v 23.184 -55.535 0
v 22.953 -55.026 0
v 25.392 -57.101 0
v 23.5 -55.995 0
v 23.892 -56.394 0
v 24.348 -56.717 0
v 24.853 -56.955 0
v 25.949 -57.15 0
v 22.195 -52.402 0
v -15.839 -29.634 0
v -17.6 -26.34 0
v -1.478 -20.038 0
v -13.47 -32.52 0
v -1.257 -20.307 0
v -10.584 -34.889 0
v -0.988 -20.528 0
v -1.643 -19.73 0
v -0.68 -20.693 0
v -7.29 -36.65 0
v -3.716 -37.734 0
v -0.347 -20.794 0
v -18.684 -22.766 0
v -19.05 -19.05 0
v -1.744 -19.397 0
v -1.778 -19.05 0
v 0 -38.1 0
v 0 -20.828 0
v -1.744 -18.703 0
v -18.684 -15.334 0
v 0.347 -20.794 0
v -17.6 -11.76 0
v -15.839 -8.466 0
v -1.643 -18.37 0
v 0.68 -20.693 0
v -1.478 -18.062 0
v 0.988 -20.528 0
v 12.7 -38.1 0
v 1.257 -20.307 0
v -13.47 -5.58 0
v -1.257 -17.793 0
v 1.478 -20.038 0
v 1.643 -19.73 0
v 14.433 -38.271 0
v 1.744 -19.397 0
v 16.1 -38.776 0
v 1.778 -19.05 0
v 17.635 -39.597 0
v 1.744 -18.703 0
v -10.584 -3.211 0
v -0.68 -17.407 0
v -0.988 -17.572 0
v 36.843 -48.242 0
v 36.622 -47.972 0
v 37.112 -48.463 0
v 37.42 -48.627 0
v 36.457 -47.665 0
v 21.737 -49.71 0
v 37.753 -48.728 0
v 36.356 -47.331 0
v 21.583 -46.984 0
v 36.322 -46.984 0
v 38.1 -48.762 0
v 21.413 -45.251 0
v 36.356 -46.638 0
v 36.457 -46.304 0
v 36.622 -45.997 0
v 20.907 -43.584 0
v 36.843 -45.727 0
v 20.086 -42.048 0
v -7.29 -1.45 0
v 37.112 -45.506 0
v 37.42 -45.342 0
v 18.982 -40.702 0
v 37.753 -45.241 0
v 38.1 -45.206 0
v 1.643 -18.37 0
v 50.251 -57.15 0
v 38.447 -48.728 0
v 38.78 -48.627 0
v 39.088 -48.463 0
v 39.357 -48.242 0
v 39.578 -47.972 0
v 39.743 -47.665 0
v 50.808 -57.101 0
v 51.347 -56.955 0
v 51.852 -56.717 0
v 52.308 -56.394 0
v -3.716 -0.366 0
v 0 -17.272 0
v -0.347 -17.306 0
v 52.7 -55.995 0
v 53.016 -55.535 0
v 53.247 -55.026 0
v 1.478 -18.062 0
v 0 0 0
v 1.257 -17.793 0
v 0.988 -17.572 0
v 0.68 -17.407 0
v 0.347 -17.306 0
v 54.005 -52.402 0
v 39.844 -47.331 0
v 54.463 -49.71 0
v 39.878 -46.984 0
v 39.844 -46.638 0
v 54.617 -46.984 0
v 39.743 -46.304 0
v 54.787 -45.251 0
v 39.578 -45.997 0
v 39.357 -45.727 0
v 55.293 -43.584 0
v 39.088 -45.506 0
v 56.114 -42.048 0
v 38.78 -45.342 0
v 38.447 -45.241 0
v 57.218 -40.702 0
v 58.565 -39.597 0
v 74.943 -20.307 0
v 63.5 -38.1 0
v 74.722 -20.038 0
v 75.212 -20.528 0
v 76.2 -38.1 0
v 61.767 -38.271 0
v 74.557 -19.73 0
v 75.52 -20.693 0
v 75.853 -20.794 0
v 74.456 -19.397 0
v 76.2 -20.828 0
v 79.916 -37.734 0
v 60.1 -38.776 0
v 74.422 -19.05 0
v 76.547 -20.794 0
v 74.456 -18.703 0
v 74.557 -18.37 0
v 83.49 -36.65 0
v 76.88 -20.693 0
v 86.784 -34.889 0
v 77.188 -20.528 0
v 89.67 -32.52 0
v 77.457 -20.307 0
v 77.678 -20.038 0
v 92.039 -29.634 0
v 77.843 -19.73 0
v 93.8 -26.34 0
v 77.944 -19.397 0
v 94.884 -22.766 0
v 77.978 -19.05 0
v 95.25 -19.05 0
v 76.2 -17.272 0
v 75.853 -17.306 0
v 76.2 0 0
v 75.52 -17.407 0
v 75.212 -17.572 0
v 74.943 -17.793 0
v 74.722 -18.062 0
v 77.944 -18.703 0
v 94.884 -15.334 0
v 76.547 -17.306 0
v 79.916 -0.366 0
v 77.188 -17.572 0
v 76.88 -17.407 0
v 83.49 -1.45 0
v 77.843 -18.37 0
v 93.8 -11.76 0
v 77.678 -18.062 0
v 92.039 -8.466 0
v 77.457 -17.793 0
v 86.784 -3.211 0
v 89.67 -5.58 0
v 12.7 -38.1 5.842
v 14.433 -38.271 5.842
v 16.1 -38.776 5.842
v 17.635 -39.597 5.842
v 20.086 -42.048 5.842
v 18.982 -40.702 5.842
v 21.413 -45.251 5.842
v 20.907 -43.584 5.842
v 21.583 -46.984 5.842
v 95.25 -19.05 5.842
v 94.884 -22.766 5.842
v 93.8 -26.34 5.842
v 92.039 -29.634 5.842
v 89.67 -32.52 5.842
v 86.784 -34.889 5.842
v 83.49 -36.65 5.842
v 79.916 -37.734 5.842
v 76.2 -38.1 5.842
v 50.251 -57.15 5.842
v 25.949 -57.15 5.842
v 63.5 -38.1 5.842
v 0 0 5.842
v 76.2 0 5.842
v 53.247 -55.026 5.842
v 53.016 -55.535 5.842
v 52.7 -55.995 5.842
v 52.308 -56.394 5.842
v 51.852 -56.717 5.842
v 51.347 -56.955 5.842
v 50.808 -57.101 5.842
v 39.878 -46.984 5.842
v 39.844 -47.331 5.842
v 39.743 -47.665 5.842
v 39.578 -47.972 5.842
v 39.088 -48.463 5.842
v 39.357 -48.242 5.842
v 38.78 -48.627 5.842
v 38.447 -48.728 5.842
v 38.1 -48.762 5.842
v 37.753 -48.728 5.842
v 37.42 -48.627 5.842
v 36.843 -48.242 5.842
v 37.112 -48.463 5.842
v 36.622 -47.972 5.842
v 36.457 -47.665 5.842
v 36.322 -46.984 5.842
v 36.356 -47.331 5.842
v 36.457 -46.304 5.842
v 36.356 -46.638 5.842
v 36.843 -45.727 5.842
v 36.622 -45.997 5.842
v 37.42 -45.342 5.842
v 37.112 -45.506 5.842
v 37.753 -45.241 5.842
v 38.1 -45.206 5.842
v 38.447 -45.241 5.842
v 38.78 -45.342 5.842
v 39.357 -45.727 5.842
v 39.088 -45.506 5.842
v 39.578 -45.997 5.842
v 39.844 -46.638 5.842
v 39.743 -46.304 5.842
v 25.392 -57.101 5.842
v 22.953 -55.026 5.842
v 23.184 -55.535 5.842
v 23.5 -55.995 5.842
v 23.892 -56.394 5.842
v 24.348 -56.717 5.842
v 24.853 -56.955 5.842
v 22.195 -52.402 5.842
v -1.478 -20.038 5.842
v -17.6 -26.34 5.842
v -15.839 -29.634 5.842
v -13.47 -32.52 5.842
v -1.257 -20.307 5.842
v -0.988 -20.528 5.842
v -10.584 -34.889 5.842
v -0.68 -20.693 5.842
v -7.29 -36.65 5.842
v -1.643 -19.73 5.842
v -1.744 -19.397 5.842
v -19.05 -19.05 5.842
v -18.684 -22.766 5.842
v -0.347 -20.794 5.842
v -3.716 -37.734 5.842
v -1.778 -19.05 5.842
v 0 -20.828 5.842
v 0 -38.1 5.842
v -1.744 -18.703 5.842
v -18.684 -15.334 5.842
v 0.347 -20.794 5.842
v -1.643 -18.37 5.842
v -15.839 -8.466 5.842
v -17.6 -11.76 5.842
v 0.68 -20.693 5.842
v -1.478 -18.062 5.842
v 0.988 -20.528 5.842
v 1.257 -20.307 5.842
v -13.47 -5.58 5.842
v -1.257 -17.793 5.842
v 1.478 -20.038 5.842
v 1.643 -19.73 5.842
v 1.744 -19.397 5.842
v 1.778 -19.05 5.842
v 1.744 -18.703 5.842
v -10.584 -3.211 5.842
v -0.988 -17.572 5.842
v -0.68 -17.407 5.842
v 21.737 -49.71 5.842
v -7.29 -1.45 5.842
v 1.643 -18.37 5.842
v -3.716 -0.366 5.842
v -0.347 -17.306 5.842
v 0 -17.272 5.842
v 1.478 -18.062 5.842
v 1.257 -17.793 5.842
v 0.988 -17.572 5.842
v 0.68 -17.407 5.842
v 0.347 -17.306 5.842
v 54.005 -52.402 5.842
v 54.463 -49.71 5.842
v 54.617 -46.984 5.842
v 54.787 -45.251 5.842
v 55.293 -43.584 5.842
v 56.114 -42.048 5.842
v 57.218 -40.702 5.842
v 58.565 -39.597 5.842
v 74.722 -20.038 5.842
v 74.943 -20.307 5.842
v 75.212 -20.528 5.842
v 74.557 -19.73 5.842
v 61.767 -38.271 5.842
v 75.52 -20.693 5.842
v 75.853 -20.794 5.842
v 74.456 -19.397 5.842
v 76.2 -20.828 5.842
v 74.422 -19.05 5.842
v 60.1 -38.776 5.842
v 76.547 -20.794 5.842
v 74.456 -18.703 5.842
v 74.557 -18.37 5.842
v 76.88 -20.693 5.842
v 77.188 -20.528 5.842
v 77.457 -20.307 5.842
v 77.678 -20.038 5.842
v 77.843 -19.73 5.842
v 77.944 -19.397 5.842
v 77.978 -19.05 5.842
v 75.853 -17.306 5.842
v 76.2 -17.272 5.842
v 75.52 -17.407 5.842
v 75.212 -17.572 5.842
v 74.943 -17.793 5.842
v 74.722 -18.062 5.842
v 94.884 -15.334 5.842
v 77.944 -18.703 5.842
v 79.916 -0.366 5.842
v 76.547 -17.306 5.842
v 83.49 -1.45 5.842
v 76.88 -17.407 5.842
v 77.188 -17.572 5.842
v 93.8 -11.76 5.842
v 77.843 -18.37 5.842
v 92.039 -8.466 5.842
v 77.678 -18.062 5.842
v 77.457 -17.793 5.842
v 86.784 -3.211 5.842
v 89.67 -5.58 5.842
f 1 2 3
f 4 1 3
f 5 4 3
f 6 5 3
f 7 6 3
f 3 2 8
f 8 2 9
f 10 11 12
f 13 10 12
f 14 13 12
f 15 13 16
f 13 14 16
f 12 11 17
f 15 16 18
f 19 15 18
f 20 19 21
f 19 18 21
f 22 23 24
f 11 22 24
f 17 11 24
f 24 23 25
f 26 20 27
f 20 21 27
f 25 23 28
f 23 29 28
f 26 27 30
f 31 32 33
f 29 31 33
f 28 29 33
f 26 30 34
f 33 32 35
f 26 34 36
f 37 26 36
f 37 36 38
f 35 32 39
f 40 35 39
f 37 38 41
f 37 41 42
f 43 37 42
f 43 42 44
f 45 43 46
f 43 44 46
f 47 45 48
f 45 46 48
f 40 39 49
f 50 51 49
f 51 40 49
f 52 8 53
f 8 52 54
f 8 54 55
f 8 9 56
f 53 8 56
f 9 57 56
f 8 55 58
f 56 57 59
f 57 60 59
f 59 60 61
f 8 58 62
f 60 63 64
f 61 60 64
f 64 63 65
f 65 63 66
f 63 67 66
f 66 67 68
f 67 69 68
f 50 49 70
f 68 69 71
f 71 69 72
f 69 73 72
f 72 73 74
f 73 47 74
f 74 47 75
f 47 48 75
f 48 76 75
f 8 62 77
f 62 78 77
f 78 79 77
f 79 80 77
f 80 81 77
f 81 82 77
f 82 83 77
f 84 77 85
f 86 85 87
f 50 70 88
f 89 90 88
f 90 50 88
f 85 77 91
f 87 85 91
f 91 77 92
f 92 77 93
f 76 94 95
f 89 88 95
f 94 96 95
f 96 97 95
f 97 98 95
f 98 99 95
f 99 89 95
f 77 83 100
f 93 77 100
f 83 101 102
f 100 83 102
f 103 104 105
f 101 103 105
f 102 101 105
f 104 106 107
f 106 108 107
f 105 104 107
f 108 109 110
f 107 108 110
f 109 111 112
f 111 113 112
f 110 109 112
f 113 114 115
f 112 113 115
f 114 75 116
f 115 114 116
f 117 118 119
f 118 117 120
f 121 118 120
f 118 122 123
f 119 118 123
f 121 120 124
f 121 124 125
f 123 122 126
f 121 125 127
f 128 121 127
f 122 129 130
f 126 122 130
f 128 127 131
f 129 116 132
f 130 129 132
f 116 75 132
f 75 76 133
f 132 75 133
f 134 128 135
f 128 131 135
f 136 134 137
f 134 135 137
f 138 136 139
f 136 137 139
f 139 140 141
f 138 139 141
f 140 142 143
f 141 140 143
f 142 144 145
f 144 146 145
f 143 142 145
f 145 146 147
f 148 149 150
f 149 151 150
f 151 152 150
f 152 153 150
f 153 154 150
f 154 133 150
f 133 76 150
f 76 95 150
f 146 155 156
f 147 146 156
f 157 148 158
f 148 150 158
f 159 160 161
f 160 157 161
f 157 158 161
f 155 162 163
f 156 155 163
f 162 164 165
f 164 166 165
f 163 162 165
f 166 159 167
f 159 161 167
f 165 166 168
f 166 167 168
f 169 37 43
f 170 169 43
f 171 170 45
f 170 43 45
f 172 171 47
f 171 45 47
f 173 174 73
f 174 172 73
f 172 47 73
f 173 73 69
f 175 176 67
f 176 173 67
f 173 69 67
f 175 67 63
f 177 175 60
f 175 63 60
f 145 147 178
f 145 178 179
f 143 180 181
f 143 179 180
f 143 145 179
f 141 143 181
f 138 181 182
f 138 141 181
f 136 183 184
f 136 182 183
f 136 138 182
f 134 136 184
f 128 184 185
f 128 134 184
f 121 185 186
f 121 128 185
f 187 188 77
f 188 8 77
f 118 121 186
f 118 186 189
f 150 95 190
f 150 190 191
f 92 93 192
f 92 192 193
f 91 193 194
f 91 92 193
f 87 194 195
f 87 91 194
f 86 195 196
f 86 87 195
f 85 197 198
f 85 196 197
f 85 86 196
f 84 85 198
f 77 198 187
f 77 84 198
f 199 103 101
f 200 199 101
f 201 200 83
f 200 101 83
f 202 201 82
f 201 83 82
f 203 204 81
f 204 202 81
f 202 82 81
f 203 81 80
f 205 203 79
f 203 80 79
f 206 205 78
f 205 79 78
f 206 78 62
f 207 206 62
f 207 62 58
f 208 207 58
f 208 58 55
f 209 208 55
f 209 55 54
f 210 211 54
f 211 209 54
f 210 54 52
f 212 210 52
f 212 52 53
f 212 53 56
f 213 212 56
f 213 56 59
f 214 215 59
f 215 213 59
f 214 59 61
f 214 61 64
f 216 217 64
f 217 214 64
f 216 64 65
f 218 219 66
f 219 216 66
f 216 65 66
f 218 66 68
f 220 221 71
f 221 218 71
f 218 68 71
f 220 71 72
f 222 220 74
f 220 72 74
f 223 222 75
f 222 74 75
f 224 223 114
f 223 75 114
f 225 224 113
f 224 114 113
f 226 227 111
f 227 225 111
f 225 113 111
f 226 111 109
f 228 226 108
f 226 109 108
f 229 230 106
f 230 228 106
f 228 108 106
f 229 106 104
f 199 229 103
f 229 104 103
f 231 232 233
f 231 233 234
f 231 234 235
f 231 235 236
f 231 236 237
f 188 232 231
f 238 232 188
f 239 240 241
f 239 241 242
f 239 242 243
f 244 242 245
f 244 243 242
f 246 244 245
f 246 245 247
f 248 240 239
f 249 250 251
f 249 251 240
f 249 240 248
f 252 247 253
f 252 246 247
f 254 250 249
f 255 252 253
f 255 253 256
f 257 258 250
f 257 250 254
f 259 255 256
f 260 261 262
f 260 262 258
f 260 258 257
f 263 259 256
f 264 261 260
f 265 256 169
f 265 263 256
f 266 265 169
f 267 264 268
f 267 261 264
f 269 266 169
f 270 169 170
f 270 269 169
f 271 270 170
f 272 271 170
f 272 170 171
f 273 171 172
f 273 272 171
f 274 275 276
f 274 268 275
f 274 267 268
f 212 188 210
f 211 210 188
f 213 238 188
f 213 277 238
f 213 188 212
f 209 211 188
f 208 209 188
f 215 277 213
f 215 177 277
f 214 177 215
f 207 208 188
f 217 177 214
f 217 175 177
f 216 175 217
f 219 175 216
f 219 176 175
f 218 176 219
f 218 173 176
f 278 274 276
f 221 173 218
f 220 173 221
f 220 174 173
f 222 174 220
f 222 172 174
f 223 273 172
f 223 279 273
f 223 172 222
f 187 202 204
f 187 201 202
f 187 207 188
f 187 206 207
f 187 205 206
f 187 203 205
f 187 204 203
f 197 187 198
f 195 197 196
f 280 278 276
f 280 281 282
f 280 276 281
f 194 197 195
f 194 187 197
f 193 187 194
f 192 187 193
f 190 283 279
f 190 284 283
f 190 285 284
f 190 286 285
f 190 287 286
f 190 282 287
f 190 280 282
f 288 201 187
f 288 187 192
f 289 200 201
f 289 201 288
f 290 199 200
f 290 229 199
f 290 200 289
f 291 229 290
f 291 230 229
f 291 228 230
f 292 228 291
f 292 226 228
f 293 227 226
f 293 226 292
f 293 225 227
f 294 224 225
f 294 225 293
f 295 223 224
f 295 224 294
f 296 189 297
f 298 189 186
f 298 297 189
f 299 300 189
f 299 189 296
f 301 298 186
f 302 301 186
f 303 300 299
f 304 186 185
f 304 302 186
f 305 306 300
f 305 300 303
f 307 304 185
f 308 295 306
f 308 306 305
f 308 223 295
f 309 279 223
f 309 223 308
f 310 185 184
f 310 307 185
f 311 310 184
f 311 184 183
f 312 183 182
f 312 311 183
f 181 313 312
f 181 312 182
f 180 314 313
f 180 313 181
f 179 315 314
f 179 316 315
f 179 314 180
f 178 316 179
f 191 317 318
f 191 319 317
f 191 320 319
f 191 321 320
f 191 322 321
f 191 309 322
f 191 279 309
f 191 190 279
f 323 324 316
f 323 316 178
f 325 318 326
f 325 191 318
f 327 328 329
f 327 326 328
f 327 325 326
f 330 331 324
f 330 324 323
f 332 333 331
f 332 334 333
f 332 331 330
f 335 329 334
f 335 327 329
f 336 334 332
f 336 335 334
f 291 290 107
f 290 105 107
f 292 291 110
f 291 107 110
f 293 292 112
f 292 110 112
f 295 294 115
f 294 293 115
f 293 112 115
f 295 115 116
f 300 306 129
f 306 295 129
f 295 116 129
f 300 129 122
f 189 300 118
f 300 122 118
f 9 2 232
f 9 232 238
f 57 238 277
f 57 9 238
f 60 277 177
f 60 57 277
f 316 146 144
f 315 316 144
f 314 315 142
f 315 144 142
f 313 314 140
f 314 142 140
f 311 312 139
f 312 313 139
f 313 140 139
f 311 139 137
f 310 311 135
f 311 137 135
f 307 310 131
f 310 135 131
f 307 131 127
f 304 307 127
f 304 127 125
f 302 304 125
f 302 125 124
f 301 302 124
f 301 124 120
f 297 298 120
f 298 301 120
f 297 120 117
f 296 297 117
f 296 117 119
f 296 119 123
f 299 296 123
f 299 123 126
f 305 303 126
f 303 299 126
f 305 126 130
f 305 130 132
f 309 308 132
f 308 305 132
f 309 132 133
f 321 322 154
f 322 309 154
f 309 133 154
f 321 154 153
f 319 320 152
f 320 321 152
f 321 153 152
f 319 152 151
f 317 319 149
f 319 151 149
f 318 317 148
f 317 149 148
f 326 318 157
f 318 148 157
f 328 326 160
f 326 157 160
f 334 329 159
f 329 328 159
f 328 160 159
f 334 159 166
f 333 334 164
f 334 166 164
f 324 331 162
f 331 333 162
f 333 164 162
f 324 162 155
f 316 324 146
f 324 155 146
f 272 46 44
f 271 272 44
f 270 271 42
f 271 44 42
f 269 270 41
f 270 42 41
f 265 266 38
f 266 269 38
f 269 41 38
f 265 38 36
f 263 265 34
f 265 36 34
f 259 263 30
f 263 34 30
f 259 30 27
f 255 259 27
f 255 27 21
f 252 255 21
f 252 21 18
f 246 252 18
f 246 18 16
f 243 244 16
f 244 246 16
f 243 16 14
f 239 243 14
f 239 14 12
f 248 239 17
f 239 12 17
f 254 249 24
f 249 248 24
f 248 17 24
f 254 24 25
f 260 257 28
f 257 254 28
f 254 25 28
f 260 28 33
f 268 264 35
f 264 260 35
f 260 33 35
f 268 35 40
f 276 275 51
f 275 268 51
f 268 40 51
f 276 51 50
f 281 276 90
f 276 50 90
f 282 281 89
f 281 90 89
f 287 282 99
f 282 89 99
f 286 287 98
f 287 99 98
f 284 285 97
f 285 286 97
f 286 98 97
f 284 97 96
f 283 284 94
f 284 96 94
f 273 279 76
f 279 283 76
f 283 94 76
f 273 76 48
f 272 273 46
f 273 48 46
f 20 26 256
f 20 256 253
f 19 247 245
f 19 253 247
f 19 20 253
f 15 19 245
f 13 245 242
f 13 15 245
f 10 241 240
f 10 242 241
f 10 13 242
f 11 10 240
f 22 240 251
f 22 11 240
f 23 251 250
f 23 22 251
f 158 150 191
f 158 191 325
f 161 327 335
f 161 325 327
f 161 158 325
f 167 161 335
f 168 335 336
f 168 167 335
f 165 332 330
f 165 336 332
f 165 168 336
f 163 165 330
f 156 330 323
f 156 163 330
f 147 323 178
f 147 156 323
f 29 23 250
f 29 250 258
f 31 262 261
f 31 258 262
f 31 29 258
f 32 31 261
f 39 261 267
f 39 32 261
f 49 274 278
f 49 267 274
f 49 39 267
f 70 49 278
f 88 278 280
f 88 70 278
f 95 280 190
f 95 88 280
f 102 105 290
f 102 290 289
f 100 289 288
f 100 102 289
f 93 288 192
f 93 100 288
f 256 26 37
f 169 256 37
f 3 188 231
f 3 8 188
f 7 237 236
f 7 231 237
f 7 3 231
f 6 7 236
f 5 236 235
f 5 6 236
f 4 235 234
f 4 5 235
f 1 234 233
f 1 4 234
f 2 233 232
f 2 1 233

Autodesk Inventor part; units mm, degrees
ref_plane "YZ Plane" through (0, 0, 0) normal (1, 0, 0) x (0, 1, 0)
ref_plane "XZ Plane" through (0, 0, 0) normal (0, 1, 0) x (-1, 0, 0)
ref_plane "XY Plane" through (0, 0, 0) normal (0, 0, 1) x (1, 0, 0)
sketch "Sketch1" plane through (0, 0, 0) normal (0, 0, 1) x (1, 0, 0)
  line L0 (0, 0) -> (76.2, 0)
  arc A0 (0, 0) -> (0, -38.1) centre (0, -19.05) ccw
  arc A1 (76.2, -38.1) -> (76.2, 0) centre (76.2, -19.05) ccw
  line L1 (76.2, -38.1) -> (63.5, -38.1)
  line L2 (0, -38.1) -> (12.7, -38.1)
  arc A2 (21.5833, -46.9837) -> (12.7, -38.1) centre (12.7, -46.9833) ccw
  arc A3 (21.5833, -46.9837) -> (22.9529, -55.026) centre (45.8763, -46.9845) ccw
  arc A4 (22.9529, -55.026) -> (25.9489, -57.15) centre (25.9489, -53.975) ccw
  arc A5 (63.5, -38.1) -> (54.6167, -46.9837) centre (63.5, -46.9833) ccw
  arc A6 (53.2471, -55.026) -> (54.6167, -46.9837) centre (30.3237, -46.9845) ccw
  arc A7 (50.2511, -57.15) -> (53.2471, -55.026) centre (50.2511, -53.975) ccw
  line L3 (25.9489, -57.15) -> (50.2511, -57.15)
  circle A8 centre (0, -19.05) radius 1.778
  circle A9 centre (76.2, -19.05) radius 1.778
  circle A10 centre (38.1, -46.9845) radius 1.778
  line L4 (-19.05, -19.05) -> (-19.05, 0)
  line L5 (95.25, -19.05) -> (95.25, 0)
  point P0 (23.8125, -57.15)
  dimension "d0" = 76.2
  dimension "d1" = 38.1
  dimension "d5" = 12.7
  dimension "d6" = 12.7
  dimension "d8" = 3.175
  dimension "d9" = 3.556
  dimension "d10" = 3.556
  dimension "d11" = 3.556
  dimension "d14" = 19.05
  dimension "d15" = 19.05
extrude "Extrusion1" add sketch "Sketch1" along normal blind 5.842
properties part number "casing"
